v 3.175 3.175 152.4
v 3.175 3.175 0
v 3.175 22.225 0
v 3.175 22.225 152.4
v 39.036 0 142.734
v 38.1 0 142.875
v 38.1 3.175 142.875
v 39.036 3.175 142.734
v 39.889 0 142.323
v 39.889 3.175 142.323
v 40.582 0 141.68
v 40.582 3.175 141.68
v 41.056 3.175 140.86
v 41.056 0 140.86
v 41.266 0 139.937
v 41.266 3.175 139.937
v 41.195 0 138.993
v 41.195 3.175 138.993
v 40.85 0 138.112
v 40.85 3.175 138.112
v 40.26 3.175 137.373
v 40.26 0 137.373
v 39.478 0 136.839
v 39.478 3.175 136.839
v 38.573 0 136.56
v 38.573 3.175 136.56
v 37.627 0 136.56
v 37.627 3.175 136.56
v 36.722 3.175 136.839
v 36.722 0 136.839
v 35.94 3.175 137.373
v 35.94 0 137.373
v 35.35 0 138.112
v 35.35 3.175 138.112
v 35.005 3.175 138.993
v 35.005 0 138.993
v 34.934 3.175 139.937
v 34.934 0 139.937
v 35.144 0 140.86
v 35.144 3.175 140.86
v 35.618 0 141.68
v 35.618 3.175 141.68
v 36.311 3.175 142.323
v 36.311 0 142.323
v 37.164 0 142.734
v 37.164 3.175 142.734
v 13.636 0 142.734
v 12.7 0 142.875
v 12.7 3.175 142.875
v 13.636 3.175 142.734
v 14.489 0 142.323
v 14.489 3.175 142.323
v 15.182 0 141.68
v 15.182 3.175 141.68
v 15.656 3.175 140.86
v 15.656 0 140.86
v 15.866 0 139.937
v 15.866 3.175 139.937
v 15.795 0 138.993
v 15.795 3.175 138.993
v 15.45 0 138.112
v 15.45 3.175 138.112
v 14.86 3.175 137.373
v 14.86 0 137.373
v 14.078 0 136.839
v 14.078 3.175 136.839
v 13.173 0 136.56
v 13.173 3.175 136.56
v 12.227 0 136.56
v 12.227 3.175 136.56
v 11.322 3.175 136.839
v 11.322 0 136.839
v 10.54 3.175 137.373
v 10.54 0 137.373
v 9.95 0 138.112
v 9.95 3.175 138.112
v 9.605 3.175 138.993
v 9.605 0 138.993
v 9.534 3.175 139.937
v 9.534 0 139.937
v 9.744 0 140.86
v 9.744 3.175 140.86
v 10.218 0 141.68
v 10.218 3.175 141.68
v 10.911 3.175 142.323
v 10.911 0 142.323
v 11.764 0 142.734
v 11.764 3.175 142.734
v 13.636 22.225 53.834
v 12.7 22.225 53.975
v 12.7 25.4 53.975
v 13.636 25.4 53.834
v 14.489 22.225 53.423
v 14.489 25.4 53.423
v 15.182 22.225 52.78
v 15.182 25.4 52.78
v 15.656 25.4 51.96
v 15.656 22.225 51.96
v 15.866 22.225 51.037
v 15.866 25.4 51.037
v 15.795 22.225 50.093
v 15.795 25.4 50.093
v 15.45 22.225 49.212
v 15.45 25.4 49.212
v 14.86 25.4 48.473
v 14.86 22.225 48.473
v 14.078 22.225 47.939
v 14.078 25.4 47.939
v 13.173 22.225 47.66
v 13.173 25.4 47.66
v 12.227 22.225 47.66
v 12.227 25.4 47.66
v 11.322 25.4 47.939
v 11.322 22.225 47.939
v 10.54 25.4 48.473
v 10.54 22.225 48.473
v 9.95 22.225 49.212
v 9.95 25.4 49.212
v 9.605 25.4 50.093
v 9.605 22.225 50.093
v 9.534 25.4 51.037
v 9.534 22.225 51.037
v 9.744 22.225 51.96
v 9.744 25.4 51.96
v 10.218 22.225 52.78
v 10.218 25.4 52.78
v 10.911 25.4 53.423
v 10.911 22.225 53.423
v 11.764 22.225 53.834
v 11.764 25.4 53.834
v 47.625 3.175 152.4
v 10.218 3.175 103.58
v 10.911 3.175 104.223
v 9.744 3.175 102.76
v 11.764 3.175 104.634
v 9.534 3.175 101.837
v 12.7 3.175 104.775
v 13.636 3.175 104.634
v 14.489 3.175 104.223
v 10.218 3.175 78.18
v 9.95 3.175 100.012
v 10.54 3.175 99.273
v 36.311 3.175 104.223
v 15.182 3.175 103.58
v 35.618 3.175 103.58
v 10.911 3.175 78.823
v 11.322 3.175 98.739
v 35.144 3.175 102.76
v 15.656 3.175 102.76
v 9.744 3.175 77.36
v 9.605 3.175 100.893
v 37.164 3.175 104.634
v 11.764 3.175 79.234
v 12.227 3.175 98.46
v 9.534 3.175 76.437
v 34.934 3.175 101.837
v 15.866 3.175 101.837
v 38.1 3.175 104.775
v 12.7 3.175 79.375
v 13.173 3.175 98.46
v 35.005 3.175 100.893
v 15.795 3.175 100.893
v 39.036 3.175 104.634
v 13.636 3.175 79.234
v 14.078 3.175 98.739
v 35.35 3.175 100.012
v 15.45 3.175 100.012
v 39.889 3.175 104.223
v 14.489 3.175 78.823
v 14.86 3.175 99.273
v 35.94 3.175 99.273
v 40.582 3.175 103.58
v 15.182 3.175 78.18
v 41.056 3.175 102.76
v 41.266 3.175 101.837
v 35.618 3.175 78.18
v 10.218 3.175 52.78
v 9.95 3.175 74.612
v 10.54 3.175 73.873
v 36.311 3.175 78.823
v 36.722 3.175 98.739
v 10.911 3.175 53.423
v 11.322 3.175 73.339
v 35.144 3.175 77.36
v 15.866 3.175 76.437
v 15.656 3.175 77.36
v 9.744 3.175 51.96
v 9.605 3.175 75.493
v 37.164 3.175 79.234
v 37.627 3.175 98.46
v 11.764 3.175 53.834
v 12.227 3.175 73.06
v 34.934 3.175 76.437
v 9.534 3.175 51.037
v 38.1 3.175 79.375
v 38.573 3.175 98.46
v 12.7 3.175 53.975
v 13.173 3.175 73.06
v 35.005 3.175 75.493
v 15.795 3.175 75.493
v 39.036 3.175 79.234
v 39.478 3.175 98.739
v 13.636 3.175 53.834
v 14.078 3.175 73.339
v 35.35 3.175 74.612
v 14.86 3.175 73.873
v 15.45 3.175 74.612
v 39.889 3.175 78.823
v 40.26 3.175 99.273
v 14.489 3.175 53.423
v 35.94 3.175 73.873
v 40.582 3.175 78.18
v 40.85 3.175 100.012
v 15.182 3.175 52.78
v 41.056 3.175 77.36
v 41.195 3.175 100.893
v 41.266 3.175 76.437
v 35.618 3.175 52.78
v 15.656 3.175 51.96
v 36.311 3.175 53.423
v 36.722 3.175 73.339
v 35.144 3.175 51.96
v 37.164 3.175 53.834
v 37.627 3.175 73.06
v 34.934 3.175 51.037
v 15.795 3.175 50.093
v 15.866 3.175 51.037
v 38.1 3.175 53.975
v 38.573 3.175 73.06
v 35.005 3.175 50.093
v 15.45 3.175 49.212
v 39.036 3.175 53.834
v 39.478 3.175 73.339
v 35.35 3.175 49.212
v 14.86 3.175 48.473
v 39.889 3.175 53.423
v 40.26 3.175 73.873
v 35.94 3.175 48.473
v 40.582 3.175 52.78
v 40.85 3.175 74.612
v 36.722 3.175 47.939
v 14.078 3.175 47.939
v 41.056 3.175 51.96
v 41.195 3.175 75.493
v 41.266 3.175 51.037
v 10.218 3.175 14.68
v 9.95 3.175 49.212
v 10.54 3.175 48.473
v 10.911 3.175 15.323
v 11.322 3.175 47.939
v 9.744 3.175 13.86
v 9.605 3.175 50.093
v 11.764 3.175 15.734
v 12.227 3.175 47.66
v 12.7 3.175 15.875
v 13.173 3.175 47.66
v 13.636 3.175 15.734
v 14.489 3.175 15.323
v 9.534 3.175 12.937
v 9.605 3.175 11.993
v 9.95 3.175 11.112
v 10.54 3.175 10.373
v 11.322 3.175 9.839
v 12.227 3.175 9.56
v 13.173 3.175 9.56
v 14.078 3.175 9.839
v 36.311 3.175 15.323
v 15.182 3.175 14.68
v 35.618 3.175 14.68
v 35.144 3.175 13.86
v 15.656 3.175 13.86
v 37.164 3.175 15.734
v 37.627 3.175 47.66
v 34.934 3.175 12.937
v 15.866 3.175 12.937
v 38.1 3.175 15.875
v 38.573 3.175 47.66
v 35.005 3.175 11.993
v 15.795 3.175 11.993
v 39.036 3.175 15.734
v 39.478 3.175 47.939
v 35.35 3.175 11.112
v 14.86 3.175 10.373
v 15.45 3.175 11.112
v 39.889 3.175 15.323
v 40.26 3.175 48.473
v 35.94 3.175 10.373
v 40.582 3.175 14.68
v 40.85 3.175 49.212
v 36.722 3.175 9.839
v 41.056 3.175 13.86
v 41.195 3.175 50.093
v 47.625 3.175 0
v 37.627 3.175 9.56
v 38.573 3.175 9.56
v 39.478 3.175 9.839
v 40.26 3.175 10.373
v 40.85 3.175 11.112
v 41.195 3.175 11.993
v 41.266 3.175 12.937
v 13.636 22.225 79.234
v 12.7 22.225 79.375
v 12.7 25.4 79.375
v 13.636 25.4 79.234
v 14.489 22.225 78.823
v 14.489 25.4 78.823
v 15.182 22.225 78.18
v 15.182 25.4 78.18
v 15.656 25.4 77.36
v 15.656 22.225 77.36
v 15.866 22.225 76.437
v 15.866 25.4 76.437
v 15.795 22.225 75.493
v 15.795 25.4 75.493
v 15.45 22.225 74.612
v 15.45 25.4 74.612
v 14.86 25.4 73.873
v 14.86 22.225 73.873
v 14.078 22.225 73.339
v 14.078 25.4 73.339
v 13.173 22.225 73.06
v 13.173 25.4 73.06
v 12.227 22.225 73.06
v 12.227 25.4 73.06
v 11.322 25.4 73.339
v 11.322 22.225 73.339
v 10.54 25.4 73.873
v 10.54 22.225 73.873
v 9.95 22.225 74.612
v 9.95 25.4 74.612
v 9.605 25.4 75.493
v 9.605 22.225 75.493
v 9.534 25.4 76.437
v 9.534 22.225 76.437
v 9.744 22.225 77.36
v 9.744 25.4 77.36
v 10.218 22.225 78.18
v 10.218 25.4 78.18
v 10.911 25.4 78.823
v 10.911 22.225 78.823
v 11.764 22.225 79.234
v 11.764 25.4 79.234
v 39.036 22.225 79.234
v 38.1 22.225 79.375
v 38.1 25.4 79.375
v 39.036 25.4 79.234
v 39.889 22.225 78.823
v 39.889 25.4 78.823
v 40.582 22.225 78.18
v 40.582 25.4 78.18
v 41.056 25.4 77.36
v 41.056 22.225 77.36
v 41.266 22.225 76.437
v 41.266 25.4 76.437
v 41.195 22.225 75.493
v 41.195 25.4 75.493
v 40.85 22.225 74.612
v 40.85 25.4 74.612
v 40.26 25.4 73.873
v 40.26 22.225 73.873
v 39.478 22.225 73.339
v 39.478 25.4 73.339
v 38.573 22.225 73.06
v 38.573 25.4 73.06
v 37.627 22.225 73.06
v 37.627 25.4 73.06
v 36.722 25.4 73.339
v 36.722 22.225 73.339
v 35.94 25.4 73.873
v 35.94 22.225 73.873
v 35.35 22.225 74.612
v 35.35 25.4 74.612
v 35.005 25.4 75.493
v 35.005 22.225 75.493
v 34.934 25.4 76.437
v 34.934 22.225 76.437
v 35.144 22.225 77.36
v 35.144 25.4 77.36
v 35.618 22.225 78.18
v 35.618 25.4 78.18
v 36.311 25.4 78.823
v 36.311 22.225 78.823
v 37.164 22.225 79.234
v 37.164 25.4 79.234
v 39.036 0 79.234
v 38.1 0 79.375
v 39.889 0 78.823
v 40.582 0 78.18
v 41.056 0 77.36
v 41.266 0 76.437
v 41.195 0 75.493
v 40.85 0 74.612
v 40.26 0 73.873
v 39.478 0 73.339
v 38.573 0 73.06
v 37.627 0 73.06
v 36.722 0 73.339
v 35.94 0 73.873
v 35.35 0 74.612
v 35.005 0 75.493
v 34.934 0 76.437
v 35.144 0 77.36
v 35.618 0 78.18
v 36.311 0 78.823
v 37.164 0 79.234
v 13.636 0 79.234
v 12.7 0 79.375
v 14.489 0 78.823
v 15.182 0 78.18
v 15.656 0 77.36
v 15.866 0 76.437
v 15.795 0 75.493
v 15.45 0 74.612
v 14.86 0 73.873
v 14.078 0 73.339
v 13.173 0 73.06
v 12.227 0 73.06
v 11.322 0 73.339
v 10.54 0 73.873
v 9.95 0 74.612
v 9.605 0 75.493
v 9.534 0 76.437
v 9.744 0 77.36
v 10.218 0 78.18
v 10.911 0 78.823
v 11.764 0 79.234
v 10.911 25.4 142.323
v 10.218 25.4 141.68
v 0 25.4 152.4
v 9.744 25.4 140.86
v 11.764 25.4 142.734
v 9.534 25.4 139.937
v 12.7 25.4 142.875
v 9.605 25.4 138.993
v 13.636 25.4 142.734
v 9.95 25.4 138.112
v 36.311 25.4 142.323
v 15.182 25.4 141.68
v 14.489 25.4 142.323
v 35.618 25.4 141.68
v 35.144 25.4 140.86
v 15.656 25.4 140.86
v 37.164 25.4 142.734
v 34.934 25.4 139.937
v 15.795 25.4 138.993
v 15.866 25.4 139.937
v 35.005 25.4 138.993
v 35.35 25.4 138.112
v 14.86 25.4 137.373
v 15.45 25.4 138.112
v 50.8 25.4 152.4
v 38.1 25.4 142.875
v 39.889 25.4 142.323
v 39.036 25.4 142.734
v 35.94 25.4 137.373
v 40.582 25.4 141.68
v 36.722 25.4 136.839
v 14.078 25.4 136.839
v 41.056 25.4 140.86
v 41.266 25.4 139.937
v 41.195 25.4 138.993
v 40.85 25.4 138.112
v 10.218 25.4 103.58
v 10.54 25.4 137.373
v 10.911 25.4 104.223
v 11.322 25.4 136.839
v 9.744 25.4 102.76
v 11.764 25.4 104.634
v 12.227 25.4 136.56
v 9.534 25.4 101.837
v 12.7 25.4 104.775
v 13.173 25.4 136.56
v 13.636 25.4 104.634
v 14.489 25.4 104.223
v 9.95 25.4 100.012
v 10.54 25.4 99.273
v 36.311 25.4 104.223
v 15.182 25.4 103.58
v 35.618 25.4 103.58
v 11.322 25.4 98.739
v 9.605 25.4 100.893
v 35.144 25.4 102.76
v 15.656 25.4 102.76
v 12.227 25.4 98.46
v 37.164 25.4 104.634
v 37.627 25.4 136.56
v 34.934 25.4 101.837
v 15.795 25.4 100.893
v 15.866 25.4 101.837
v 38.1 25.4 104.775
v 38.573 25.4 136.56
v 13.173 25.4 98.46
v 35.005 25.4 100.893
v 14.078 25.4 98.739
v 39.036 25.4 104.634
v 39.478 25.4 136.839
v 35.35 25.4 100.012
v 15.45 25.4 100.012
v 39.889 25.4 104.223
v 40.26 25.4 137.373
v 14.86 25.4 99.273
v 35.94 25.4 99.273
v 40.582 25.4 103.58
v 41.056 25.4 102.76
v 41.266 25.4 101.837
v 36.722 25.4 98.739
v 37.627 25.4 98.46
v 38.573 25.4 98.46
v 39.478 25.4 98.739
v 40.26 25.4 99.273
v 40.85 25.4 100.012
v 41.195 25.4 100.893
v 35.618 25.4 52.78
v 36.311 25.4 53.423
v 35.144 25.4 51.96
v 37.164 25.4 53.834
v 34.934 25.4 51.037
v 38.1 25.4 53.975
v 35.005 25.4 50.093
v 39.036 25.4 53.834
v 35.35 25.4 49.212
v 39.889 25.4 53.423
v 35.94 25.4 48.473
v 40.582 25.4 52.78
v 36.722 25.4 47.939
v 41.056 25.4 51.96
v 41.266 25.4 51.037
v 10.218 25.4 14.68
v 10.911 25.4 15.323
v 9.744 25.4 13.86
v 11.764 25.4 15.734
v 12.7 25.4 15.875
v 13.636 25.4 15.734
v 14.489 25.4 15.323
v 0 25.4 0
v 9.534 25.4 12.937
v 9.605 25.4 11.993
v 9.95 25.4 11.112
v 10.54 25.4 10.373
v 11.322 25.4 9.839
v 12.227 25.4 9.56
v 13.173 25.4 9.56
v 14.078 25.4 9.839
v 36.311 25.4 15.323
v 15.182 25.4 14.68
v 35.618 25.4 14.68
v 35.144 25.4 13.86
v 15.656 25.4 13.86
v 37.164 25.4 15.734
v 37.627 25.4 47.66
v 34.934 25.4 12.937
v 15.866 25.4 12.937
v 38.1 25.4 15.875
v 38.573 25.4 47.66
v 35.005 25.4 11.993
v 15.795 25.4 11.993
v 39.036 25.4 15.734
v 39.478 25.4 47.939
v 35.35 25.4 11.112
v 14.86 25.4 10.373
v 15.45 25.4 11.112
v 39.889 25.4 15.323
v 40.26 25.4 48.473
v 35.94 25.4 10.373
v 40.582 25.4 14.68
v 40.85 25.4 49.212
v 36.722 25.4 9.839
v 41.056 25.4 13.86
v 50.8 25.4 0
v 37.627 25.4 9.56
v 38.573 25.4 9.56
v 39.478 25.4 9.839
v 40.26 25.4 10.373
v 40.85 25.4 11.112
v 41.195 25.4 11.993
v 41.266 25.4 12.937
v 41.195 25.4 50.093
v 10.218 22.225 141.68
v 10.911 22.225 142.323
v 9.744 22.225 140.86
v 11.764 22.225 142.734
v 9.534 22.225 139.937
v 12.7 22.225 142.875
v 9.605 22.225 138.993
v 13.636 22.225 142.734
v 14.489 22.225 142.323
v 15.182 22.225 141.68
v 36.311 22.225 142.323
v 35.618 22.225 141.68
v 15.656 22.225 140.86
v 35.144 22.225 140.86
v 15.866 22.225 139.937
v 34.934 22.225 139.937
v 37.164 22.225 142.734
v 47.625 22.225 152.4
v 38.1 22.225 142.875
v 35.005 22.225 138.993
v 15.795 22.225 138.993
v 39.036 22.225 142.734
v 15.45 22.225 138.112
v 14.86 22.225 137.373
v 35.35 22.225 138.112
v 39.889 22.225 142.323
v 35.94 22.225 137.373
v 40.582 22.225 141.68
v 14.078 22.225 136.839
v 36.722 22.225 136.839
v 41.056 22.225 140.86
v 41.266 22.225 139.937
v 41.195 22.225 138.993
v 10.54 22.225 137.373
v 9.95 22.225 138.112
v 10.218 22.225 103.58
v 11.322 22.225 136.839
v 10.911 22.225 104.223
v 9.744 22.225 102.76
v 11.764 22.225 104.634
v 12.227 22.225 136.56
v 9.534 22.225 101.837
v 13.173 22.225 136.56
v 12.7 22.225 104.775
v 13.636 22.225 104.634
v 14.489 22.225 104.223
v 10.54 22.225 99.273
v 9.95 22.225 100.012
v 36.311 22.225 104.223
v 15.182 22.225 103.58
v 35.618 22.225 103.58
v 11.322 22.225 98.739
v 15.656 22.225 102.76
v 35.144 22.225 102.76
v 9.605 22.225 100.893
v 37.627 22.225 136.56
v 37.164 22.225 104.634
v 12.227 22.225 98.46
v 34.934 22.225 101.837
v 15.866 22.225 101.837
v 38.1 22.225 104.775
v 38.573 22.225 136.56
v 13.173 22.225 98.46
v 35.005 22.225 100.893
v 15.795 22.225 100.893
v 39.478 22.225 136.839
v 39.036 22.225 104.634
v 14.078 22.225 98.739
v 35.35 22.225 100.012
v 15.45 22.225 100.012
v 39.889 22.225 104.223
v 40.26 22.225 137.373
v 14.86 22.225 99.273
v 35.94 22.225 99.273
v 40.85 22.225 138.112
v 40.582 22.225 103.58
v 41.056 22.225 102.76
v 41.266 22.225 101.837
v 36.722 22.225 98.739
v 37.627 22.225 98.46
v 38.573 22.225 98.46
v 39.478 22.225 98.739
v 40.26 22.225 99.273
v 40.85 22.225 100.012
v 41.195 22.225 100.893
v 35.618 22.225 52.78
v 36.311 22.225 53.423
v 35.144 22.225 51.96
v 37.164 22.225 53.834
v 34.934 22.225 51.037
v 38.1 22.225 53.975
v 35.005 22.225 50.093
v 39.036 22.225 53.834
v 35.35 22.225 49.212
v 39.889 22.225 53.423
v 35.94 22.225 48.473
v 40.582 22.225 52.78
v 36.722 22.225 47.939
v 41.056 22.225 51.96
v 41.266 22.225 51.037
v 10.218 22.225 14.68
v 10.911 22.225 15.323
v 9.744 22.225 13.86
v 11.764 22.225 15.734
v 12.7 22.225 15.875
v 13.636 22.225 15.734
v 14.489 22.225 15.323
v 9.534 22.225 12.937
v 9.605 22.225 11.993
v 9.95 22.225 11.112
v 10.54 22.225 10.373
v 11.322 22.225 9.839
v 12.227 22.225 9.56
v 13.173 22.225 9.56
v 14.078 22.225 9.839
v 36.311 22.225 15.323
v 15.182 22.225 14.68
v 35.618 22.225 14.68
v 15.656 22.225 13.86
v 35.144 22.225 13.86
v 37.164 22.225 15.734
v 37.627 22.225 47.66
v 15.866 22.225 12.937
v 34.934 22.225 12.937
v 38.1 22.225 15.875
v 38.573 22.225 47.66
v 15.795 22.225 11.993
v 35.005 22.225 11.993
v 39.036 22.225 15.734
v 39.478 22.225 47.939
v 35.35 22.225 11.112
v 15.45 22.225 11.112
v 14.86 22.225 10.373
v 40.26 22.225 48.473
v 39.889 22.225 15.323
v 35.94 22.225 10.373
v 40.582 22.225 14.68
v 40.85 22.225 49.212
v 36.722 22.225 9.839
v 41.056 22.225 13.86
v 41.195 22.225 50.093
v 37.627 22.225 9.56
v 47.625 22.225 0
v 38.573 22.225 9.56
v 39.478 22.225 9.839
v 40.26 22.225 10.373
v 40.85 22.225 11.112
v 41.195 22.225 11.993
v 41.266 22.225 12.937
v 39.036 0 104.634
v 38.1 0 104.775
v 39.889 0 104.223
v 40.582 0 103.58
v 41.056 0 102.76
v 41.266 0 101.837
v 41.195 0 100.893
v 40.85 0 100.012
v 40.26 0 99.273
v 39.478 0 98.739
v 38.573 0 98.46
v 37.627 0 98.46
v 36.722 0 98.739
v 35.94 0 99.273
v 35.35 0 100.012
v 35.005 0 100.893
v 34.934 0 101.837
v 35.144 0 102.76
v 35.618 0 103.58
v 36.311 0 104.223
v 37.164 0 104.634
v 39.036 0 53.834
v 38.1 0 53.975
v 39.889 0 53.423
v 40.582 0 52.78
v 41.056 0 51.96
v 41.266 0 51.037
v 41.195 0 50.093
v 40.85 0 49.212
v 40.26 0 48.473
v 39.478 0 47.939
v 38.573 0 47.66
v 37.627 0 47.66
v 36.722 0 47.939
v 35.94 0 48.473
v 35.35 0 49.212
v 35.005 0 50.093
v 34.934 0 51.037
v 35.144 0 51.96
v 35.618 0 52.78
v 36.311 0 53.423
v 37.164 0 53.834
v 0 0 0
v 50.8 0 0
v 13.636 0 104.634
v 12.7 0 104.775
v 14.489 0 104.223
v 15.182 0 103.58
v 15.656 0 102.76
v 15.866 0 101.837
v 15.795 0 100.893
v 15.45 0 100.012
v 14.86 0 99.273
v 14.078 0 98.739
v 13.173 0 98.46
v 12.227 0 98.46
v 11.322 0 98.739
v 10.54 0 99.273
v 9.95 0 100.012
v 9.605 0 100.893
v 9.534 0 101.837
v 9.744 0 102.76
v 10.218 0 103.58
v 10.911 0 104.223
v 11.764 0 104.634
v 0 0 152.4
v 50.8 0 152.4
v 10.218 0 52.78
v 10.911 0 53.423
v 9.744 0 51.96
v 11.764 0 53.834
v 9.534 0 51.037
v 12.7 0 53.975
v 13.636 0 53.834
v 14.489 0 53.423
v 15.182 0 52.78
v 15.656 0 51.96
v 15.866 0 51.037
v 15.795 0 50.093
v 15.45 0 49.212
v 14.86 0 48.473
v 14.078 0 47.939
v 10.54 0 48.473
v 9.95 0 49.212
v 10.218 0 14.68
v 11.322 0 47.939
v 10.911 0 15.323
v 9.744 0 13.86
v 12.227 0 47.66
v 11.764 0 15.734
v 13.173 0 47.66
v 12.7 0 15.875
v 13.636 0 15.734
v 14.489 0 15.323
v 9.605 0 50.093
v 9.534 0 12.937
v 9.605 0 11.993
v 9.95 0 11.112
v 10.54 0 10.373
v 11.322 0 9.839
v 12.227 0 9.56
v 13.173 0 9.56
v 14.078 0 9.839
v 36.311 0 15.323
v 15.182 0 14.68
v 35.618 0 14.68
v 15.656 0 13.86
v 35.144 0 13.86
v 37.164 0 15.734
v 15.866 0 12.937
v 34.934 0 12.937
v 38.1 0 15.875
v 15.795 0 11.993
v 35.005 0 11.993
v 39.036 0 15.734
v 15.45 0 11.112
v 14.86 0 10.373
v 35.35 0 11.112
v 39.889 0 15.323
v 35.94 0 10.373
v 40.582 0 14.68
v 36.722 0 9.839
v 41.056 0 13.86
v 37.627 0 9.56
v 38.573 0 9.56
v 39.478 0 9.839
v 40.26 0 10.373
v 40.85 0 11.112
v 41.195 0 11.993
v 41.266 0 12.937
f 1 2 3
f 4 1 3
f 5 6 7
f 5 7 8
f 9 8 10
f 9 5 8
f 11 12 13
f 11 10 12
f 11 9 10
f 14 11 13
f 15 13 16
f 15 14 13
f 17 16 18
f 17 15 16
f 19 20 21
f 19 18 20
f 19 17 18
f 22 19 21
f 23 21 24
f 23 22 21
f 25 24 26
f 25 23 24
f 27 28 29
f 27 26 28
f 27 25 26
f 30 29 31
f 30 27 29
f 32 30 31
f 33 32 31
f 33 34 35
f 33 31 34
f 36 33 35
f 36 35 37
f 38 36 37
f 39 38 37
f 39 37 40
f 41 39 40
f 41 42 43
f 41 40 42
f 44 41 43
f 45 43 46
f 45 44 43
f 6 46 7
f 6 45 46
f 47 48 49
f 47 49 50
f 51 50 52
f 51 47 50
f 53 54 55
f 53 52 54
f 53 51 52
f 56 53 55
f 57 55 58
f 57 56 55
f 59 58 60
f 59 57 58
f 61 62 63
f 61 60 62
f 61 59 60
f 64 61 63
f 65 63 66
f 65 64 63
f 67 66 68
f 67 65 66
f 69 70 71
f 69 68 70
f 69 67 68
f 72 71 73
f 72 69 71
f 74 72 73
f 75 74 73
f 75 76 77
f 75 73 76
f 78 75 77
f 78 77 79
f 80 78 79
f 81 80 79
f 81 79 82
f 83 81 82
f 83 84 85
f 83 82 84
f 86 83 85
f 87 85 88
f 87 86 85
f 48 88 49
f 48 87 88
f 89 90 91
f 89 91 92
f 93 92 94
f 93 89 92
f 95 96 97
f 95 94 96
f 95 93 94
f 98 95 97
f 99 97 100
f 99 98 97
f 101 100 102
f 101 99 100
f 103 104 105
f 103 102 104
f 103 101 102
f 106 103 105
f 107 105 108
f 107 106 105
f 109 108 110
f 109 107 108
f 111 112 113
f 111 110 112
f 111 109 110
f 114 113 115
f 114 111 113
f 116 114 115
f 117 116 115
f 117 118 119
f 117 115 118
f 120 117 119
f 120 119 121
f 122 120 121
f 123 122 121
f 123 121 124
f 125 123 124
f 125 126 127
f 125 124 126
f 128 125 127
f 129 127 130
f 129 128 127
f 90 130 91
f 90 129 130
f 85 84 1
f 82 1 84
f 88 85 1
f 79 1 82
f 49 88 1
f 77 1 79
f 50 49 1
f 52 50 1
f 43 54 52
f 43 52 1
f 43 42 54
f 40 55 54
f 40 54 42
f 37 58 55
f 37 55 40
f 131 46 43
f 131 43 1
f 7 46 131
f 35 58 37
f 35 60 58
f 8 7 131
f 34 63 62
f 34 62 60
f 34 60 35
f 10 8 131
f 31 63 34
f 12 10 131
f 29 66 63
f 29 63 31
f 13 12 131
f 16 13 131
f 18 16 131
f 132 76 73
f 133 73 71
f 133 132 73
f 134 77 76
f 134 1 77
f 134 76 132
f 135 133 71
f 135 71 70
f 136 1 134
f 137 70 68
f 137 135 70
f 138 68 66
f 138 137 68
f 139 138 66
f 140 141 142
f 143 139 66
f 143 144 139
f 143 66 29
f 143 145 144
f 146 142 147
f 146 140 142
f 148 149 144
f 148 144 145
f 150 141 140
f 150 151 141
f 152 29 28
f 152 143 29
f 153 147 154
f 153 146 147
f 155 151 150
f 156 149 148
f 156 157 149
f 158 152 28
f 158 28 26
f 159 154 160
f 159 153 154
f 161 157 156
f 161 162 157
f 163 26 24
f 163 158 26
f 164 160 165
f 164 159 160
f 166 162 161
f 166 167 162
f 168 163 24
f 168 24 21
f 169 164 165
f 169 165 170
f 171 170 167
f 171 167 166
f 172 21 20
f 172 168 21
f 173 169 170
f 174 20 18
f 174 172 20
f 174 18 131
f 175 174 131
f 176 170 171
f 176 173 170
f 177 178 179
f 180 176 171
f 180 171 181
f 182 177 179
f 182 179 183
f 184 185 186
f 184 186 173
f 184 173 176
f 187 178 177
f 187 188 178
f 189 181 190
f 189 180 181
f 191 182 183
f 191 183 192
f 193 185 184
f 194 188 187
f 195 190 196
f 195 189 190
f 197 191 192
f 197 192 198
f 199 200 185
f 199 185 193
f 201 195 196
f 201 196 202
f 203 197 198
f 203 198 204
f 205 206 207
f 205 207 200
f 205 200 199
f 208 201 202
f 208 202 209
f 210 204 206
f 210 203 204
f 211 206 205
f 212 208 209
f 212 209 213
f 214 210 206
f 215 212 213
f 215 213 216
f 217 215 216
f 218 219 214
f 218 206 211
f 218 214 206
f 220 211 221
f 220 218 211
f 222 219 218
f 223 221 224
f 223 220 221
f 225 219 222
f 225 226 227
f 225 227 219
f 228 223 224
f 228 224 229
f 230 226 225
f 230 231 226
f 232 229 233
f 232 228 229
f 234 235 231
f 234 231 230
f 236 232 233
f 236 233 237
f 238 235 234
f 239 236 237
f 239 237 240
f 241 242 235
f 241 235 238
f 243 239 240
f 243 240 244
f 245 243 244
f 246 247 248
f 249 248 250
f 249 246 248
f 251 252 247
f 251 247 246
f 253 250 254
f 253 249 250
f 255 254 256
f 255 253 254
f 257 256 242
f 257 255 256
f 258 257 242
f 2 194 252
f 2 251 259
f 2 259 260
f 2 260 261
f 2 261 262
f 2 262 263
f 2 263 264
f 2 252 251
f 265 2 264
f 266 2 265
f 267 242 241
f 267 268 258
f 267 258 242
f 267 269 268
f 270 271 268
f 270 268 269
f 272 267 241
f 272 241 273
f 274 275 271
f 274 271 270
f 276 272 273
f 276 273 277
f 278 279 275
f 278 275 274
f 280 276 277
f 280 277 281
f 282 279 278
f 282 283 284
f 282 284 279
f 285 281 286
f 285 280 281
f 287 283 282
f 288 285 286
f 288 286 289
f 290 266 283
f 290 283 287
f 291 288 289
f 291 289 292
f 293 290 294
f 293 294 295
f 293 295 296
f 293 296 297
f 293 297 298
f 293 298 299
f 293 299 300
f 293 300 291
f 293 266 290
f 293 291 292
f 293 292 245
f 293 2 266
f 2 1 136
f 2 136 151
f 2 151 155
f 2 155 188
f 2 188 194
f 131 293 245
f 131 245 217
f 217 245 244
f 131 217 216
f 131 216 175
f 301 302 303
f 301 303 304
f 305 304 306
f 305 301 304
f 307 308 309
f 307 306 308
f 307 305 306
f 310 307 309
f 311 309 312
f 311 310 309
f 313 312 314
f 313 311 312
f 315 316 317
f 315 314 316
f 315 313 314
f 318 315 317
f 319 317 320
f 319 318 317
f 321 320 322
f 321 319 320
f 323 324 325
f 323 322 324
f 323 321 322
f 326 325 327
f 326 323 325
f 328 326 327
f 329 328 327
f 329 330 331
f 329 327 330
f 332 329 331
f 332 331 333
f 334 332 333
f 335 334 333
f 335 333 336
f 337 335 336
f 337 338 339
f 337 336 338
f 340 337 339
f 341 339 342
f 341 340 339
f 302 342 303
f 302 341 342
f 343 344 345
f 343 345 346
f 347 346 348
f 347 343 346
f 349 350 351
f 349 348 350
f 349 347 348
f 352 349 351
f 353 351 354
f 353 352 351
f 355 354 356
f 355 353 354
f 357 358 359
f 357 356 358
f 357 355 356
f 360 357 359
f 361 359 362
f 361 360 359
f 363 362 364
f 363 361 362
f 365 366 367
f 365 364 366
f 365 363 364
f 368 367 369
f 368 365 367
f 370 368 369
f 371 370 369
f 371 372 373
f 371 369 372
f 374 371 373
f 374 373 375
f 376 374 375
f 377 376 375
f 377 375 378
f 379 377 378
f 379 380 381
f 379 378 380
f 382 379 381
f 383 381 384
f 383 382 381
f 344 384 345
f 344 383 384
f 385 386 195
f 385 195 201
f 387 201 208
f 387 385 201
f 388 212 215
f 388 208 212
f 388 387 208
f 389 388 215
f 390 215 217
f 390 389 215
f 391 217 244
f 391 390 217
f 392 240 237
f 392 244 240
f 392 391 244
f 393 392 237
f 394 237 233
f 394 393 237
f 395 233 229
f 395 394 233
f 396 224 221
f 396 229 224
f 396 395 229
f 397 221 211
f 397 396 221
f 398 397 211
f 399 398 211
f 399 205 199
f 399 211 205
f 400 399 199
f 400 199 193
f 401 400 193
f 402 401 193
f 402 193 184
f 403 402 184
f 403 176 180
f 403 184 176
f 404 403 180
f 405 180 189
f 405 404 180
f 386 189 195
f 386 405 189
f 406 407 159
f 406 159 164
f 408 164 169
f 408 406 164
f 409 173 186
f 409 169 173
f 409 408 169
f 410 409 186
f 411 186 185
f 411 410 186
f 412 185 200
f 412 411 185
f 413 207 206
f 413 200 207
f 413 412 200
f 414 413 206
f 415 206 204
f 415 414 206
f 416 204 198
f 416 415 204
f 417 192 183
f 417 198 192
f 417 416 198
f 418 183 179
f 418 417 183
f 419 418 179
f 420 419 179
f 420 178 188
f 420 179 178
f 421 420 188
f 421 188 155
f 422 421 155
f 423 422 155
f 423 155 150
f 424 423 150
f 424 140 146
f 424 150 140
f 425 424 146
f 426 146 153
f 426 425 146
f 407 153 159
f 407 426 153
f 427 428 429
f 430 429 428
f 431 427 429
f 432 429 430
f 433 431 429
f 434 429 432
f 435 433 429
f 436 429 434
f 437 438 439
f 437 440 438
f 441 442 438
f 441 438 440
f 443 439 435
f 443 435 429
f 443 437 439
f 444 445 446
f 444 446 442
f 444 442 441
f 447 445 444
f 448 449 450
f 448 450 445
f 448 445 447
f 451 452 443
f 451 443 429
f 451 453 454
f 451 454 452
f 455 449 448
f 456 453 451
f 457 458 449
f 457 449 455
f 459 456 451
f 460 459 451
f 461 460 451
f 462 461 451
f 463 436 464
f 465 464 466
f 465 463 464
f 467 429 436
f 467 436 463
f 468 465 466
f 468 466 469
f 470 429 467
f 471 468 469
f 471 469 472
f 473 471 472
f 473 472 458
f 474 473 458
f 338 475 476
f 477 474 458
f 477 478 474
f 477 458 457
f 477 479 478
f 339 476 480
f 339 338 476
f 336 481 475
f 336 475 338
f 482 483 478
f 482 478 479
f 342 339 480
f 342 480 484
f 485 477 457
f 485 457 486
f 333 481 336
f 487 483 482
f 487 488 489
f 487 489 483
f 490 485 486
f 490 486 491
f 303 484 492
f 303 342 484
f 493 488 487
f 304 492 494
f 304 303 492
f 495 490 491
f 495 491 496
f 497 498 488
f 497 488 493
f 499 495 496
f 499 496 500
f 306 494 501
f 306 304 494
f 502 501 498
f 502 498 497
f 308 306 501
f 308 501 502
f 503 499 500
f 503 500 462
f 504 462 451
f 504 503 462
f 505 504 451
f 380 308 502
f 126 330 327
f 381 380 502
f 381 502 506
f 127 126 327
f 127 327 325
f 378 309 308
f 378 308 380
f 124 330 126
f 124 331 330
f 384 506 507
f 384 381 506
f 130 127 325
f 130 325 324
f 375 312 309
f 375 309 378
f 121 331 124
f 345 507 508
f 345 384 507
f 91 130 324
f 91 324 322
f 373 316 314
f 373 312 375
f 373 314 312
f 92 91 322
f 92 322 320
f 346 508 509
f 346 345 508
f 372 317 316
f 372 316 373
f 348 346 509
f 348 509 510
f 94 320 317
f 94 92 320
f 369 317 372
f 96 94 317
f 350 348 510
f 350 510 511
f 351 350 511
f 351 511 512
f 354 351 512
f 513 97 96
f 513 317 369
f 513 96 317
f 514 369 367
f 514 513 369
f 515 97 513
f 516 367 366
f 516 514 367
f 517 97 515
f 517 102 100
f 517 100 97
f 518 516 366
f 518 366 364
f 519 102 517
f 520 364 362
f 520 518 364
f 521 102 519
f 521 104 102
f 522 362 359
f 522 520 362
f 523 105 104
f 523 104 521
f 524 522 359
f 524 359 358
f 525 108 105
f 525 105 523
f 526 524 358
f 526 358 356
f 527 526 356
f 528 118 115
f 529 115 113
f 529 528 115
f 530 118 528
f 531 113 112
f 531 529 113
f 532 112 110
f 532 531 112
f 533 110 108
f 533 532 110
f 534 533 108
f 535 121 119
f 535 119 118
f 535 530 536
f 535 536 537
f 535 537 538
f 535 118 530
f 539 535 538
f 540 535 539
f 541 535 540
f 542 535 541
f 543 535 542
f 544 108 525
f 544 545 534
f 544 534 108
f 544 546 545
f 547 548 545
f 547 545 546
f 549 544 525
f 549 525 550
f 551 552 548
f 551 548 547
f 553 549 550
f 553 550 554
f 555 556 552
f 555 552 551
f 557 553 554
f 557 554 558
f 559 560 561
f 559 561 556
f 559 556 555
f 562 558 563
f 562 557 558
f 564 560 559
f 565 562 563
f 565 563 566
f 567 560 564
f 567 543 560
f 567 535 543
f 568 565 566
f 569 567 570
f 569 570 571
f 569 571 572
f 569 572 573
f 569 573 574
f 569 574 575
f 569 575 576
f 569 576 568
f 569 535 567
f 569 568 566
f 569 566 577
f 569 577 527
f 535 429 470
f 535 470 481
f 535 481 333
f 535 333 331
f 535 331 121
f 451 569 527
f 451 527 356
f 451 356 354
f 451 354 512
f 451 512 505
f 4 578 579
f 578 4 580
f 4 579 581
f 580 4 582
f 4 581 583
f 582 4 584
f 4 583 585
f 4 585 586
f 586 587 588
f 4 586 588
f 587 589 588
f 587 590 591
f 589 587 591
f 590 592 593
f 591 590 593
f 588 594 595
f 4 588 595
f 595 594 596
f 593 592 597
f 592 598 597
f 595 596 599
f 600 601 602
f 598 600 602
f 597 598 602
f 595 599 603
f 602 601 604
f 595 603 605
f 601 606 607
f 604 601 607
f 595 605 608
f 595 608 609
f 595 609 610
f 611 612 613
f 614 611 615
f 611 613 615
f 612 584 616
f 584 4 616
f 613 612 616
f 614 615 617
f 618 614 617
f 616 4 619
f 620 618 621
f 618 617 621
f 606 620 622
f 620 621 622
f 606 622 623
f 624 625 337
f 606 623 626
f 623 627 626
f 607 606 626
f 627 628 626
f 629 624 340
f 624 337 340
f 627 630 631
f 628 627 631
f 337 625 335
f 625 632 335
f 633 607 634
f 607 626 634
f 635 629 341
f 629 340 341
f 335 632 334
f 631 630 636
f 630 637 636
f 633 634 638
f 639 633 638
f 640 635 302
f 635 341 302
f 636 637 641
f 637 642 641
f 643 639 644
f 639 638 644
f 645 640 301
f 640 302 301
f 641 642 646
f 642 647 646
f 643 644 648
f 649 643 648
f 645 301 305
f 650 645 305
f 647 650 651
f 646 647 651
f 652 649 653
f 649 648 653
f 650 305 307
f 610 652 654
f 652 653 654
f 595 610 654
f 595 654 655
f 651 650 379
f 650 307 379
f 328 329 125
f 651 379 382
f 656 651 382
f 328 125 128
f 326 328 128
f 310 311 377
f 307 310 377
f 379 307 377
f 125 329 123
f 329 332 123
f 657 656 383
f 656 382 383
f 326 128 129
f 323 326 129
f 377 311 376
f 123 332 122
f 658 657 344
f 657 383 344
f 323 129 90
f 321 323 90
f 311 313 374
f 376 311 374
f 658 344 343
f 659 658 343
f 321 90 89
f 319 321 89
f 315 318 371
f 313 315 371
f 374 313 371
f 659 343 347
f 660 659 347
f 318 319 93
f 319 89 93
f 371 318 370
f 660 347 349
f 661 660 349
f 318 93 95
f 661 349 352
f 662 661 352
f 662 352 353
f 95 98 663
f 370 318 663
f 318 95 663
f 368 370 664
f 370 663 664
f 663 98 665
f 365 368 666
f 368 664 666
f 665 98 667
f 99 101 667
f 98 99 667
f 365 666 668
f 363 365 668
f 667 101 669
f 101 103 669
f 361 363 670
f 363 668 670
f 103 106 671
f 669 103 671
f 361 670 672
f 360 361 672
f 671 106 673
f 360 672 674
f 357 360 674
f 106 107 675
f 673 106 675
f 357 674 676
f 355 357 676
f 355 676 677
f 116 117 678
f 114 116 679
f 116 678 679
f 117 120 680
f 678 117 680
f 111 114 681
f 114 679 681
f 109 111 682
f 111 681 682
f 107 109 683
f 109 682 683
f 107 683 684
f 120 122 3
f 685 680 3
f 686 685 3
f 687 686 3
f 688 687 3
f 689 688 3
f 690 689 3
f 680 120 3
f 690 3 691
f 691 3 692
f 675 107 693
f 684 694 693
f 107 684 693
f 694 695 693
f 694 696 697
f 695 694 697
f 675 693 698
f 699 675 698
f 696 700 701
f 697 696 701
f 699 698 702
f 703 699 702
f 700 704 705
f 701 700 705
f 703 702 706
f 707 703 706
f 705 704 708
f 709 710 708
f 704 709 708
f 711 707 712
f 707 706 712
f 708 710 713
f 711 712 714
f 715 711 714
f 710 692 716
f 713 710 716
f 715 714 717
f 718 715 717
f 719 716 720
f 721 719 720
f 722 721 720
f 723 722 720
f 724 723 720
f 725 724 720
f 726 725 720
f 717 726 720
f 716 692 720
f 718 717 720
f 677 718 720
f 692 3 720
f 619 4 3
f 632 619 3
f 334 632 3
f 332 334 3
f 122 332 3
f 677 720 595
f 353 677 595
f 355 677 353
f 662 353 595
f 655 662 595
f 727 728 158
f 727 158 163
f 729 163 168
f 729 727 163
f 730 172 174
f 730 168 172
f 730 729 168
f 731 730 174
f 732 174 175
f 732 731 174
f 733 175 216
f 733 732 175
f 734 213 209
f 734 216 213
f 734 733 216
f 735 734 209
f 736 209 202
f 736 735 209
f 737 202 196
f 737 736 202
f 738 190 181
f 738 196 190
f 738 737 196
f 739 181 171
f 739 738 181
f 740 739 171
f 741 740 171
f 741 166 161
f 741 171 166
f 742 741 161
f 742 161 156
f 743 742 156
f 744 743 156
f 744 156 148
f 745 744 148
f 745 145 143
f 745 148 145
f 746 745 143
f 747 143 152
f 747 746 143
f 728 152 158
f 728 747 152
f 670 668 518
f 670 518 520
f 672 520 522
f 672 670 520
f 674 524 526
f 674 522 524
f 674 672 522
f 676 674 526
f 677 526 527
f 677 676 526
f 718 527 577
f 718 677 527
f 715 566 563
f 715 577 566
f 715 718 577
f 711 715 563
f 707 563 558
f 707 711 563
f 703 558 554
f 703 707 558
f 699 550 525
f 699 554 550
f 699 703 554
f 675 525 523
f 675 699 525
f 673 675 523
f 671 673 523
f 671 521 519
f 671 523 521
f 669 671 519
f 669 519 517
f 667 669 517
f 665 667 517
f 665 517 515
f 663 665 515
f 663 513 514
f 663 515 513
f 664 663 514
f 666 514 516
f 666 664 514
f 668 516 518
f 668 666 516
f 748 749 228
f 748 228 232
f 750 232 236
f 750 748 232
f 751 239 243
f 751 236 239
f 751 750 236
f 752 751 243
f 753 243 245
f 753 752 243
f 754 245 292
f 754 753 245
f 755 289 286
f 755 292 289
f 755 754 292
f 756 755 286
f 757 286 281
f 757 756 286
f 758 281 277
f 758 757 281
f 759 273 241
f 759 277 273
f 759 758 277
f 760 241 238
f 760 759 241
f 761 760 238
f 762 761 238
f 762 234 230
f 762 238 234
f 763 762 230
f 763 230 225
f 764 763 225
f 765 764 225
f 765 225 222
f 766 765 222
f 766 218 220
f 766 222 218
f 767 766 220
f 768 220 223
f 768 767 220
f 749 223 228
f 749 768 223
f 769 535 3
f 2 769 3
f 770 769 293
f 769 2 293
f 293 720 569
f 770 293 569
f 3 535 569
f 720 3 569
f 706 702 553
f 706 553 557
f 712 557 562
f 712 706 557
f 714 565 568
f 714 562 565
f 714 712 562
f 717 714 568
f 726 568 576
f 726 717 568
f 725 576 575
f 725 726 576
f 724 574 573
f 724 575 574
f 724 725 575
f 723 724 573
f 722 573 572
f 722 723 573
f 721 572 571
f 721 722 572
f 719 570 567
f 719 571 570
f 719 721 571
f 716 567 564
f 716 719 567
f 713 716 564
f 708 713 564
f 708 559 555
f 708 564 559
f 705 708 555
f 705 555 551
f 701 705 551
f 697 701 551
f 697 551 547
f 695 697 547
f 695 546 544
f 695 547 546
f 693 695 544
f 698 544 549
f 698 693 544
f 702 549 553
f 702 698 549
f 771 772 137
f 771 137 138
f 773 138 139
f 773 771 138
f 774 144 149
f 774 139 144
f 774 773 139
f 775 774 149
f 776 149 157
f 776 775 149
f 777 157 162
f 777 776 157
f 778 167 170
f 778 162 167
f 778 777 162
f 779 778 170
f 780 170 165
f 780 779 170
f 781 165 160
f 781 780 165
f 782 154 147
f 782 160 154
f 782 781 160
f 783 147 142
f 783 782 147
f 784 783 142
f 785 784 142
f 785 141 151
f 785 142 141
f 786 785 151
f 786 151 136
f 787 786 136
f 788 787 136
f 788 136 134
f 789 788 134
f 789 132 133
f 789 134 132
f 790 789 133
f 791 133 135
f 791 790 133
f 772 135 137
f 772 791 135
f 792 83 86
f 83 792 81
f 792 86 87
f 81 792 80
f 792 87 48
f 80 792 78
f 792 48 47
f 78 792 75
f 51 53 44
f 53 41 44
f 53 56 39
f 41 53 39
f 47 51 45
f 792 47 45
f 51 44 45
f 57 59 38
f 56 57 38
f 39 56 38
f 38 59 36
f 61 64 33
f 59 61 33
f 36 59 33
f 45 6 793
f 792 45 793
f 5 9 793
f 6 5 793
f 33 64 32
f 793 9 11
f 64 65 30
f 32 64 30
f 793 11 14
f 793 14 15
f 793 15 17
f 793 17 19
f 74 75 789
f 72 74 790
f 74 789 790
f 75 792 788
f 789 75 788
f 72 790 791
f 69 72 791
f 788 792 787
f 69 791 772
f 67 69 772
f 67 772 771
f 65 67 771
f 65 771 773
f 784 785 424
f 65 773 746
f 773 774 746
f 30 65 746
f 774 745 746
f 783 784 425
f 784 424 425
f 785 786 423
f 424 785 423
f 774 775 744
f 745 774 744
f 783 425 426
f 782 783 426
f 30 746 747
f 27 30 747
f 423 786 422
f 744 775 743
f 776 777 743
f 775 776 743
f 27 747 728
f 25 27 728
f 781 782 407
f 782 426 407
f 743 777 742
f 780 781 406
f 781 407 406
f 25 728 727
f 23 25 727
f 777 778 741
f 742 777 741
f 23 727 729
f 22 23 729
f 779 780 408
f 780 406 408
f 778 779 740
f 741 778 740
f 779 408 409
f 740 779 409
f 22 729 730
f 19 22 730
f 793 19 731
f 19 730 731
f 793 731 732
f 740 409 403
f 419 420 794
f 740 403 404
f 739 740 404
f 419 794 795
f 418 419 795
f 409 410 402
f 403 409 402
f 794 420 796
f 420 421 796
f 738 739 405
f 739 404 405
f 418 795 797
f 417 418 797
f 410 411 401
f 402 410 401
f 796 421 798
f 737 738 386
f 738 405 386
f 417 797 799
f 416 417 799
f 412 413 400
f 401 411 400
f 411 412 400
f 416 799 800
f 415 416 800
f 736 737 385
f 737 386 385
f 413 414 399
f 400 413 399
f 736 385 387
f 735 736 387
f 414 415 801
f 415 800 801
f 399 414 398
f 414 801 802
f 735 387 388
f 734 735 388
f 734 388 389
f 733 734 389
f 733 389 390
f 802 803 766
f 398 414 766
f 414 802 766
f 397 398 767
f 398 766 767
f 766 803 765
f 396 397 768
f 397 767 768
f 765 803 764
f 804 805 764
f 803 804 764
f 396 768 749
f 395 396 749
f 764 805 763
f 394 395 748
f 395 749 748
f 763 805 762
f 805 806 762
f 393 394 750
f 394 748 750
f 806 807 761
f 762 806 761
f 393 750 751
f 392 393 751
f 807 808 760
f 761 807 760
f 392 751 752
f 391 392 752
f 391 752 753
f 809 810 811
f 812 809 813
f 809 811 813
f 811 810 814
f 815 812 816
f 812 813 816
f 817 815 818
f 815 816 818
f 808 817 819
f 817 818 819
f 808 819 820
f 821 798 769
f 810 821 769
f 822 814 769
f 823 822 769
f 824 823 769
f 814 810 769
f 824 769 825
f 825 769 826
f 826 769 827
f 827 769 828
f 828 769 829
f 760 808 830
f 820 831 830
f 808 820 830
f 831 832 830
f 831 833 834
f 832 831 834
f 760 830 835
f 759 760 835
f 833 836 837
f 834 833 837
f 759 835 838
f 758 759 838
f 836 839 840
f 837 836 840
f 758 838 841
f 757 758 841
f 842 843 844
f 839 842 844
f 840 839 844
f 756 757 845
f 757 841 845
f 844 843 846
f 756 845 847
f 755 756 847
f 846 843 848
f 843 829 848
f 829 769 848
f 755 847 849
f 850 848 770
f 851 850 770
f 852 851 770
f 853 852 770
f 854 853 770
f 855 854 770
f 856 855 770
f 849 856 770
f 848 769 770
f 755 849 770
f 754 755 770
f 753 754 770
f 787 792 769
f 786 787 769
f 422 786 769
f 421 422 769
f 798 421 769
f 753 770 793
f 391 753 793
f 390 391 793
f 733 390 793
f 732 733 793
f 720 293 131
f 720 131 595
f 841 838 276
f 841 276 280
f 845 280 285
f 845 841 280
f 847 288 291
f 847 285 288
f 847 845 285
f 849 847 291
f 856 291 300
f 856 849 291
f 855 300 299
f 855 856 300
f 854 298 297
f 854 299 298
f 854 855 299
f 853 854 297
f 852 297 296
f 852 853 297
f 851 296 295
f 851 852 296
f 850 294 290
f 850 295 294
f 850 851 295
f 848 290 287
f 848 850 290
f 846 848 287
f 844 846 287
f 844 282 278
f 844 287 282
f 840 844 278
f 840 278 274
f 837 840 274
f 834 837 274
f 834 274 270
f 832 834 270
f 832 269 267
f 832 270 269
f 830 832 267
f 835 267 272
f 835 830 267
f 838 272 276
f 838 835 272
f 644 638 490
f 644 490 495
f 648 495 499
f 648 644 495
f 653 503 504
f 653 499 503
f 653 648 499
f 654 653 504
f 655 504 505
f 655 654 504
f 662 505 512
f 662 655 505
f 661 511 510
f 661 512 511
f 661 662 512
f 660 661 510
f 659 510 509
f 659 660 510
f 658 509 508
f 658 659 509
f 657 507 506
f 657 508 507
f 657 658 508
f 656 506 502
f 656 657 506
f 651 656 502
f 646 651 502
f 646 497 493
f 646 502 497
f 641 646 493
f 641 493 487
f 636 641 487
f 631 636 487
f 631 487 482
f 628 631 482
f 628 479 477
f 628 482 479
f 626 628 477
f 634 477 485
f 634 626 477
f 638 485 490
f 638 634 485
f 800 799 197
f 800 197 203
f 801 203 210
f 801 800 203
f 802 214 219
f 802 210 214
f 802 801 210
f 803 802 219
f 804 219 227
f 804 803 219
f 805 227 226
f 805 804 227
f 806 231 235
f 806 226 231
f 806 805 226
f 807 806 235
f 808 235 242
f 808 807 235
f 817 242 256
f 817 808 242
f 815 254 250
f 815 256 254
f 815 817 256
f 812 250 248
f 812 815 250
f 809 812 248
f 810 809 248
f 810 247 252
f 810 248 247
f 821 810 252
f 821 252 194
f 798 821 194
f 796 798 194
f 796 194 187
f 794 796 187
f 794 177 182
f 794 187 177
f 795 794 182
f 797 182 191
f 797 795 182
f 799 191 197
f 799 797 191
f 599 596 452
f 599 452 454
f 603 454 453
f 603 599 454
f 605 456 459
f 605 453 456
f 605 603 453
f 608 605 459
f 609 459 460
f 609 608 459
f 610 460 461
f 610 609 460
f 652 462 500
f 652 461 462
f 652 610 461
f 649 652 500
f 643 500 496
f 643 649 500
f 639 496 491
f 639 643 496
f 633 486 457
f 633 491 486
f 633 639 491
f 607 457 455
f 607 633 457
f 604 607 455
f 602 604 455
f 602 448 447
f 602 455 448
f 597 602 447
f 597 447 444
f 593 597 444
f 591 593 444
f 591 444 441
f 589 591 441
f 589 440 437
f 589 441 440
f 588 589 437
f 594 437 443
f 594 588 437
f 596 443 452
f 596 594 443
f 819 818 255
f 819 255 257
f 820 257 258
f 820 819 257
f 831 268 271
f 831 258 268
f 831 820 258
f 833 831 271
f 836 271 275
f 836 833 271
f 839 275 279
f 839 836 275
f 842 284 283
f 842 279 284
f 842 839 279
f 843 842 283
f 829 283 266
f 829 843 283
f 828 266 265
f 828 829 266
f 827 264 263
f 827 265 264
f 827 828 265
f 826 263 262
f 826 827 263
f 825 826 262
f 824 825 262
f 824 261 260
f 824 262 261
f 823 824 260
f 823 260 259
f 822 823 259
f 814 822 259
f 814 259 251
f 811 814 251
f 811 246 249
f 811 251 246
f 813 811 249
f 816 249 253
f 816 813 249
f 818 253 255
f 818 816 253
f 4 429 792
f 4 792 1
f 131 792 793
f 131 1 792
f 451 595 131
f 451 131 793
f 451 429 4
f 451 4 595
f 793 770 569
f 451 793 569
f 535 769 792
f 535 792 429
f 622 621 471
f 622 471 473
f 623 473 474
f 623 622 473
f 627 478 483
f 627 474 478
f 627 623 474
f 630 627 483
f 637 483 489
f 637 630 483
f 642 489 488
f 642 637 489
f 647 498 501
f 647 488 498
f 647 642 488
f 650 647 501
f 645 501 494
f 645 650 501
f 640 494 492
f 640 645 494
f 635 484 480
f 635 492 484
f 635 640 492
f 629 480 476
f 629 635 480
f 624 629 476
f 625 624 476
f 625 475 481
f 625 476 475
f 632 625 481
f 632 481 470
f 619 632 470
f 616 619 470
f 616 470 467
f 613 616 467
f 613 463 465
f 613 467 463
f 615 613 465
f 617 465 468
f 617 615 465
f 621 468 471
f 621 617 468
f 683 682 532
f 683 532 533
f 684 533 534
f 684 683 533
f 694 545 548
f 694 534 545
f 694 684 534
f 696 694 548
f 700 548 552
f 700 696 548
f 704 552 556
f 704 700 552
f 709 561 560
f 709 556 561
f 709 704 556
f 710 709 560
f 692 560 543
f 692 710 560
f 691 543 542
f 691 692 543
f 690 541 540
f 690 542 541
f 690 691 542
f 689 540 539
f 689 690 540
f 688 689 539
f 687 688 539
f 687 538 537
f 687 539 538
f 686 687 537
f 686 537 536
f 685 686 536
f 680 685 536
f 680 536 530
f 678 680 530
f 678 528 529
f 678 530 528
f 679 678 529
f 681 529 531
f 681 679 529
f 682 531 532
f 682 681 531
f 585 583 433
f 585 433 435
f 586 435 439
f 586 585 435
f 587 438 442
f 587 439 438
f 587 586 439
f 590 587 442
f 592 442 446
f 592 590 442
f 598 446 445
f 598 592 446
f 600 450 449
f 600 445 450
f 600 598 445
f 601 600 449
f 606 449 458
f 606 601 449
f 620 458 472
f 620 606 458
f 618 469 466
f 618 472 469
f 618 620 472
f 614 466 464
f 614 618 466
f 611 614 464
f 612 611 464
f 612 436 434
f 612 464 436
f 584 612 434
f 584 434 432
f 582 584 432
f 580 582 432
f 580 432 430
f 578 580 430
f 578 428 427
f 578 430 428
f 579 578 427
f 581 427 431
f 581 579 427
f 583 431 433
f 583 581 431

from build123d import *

# Parameters (mm, degrees)
SKETCH1_W               = 50.8
SKETCH1_H               = 25.4
SKETCH1_W_2             = 44.45
SKETCH1_H_2             = 19.05
BOSS_EXTRUDE1_DEPTH     = 152.4
CUT_EXTRUDE1_DEPTH      = 163.639355631
CUT_EXTRUDE1_DEPTH_BACK = 163.639355631
SKETCH2_R               = 3.175


with BuildPart() as part:
    # Sketch1 → Boss-Extrude1 (new body)
    with BuildSketch(Plane.XY):
        with Locations((25.4, 12.7)):
            Rectangle(SKETCH1_W, SKETCH1_H)
        with Locations((25.4, 12.7)):
            Rectangle(SKETCH1_W_2, SKETCH1_H_2, mode=Mode.SUBTRACT)
    extrude(amount=BOSS_EXTRUDE1_DEPTH)

    # Sketch2 → Cut-Extrude1 (cut, two sides: drawn at the far end of the back side and taken through both)
    with BuildSketch(Plane(origin=(0, 25.4, 0), x_dir=(1, 0, 0), z_dir=(0, 1, 0)).offset(-CUT_EXTRUDE1_DEPTH_BACK)):
        with Locations(Location((12.7, -12.7, 0), (0, 0, 270))):
            Circle(SKETCH2_R)
        with Locations(Location((12.7, -50.8, 0), (0, 0, 270))):
            Circle(SKETCH2_R)
        with Locations(Location((12.7, -76.2, 0), (0, 0, 270))):
            Circle(SKETCH2_R)
        with Locations(Location((12.7, -101.6, 0), (0, 0, 270))):
            Circle(SKETCH2_R)
        with Locations(Location((12.7, -139.7, 0), (0, 0, 270))):
            Circle(SKETCH2_R)
        with Locations(Location((38.1, -139.7, 0), (0, 0, 270))):
            Circle(SKETCH2_R)
        with Locations(Location((38.1, -101.6, 0), (0, 0, 270))):
            Circle(SKETCH2_R)
        with Locations(Location((38.1, -76.2, 0), (0, 0, 270))):
            Circle(SKETCH2_R)
        with Locations(Location((38.1, -12.7, 0), (0, 0, 270))):
            Circle(SKETCH2_R)
        with Locations(Location((38.1, -50.8, 0), (0, 0, 270))):
            Circle(SKETCH2_R)
    extrude(amount=CUT_EXTRUDE1_DEPTH + CUT_EXTRUDE1_DEPTH_BACK, mode=Mode.SUBTRACT)


solid = part.part
